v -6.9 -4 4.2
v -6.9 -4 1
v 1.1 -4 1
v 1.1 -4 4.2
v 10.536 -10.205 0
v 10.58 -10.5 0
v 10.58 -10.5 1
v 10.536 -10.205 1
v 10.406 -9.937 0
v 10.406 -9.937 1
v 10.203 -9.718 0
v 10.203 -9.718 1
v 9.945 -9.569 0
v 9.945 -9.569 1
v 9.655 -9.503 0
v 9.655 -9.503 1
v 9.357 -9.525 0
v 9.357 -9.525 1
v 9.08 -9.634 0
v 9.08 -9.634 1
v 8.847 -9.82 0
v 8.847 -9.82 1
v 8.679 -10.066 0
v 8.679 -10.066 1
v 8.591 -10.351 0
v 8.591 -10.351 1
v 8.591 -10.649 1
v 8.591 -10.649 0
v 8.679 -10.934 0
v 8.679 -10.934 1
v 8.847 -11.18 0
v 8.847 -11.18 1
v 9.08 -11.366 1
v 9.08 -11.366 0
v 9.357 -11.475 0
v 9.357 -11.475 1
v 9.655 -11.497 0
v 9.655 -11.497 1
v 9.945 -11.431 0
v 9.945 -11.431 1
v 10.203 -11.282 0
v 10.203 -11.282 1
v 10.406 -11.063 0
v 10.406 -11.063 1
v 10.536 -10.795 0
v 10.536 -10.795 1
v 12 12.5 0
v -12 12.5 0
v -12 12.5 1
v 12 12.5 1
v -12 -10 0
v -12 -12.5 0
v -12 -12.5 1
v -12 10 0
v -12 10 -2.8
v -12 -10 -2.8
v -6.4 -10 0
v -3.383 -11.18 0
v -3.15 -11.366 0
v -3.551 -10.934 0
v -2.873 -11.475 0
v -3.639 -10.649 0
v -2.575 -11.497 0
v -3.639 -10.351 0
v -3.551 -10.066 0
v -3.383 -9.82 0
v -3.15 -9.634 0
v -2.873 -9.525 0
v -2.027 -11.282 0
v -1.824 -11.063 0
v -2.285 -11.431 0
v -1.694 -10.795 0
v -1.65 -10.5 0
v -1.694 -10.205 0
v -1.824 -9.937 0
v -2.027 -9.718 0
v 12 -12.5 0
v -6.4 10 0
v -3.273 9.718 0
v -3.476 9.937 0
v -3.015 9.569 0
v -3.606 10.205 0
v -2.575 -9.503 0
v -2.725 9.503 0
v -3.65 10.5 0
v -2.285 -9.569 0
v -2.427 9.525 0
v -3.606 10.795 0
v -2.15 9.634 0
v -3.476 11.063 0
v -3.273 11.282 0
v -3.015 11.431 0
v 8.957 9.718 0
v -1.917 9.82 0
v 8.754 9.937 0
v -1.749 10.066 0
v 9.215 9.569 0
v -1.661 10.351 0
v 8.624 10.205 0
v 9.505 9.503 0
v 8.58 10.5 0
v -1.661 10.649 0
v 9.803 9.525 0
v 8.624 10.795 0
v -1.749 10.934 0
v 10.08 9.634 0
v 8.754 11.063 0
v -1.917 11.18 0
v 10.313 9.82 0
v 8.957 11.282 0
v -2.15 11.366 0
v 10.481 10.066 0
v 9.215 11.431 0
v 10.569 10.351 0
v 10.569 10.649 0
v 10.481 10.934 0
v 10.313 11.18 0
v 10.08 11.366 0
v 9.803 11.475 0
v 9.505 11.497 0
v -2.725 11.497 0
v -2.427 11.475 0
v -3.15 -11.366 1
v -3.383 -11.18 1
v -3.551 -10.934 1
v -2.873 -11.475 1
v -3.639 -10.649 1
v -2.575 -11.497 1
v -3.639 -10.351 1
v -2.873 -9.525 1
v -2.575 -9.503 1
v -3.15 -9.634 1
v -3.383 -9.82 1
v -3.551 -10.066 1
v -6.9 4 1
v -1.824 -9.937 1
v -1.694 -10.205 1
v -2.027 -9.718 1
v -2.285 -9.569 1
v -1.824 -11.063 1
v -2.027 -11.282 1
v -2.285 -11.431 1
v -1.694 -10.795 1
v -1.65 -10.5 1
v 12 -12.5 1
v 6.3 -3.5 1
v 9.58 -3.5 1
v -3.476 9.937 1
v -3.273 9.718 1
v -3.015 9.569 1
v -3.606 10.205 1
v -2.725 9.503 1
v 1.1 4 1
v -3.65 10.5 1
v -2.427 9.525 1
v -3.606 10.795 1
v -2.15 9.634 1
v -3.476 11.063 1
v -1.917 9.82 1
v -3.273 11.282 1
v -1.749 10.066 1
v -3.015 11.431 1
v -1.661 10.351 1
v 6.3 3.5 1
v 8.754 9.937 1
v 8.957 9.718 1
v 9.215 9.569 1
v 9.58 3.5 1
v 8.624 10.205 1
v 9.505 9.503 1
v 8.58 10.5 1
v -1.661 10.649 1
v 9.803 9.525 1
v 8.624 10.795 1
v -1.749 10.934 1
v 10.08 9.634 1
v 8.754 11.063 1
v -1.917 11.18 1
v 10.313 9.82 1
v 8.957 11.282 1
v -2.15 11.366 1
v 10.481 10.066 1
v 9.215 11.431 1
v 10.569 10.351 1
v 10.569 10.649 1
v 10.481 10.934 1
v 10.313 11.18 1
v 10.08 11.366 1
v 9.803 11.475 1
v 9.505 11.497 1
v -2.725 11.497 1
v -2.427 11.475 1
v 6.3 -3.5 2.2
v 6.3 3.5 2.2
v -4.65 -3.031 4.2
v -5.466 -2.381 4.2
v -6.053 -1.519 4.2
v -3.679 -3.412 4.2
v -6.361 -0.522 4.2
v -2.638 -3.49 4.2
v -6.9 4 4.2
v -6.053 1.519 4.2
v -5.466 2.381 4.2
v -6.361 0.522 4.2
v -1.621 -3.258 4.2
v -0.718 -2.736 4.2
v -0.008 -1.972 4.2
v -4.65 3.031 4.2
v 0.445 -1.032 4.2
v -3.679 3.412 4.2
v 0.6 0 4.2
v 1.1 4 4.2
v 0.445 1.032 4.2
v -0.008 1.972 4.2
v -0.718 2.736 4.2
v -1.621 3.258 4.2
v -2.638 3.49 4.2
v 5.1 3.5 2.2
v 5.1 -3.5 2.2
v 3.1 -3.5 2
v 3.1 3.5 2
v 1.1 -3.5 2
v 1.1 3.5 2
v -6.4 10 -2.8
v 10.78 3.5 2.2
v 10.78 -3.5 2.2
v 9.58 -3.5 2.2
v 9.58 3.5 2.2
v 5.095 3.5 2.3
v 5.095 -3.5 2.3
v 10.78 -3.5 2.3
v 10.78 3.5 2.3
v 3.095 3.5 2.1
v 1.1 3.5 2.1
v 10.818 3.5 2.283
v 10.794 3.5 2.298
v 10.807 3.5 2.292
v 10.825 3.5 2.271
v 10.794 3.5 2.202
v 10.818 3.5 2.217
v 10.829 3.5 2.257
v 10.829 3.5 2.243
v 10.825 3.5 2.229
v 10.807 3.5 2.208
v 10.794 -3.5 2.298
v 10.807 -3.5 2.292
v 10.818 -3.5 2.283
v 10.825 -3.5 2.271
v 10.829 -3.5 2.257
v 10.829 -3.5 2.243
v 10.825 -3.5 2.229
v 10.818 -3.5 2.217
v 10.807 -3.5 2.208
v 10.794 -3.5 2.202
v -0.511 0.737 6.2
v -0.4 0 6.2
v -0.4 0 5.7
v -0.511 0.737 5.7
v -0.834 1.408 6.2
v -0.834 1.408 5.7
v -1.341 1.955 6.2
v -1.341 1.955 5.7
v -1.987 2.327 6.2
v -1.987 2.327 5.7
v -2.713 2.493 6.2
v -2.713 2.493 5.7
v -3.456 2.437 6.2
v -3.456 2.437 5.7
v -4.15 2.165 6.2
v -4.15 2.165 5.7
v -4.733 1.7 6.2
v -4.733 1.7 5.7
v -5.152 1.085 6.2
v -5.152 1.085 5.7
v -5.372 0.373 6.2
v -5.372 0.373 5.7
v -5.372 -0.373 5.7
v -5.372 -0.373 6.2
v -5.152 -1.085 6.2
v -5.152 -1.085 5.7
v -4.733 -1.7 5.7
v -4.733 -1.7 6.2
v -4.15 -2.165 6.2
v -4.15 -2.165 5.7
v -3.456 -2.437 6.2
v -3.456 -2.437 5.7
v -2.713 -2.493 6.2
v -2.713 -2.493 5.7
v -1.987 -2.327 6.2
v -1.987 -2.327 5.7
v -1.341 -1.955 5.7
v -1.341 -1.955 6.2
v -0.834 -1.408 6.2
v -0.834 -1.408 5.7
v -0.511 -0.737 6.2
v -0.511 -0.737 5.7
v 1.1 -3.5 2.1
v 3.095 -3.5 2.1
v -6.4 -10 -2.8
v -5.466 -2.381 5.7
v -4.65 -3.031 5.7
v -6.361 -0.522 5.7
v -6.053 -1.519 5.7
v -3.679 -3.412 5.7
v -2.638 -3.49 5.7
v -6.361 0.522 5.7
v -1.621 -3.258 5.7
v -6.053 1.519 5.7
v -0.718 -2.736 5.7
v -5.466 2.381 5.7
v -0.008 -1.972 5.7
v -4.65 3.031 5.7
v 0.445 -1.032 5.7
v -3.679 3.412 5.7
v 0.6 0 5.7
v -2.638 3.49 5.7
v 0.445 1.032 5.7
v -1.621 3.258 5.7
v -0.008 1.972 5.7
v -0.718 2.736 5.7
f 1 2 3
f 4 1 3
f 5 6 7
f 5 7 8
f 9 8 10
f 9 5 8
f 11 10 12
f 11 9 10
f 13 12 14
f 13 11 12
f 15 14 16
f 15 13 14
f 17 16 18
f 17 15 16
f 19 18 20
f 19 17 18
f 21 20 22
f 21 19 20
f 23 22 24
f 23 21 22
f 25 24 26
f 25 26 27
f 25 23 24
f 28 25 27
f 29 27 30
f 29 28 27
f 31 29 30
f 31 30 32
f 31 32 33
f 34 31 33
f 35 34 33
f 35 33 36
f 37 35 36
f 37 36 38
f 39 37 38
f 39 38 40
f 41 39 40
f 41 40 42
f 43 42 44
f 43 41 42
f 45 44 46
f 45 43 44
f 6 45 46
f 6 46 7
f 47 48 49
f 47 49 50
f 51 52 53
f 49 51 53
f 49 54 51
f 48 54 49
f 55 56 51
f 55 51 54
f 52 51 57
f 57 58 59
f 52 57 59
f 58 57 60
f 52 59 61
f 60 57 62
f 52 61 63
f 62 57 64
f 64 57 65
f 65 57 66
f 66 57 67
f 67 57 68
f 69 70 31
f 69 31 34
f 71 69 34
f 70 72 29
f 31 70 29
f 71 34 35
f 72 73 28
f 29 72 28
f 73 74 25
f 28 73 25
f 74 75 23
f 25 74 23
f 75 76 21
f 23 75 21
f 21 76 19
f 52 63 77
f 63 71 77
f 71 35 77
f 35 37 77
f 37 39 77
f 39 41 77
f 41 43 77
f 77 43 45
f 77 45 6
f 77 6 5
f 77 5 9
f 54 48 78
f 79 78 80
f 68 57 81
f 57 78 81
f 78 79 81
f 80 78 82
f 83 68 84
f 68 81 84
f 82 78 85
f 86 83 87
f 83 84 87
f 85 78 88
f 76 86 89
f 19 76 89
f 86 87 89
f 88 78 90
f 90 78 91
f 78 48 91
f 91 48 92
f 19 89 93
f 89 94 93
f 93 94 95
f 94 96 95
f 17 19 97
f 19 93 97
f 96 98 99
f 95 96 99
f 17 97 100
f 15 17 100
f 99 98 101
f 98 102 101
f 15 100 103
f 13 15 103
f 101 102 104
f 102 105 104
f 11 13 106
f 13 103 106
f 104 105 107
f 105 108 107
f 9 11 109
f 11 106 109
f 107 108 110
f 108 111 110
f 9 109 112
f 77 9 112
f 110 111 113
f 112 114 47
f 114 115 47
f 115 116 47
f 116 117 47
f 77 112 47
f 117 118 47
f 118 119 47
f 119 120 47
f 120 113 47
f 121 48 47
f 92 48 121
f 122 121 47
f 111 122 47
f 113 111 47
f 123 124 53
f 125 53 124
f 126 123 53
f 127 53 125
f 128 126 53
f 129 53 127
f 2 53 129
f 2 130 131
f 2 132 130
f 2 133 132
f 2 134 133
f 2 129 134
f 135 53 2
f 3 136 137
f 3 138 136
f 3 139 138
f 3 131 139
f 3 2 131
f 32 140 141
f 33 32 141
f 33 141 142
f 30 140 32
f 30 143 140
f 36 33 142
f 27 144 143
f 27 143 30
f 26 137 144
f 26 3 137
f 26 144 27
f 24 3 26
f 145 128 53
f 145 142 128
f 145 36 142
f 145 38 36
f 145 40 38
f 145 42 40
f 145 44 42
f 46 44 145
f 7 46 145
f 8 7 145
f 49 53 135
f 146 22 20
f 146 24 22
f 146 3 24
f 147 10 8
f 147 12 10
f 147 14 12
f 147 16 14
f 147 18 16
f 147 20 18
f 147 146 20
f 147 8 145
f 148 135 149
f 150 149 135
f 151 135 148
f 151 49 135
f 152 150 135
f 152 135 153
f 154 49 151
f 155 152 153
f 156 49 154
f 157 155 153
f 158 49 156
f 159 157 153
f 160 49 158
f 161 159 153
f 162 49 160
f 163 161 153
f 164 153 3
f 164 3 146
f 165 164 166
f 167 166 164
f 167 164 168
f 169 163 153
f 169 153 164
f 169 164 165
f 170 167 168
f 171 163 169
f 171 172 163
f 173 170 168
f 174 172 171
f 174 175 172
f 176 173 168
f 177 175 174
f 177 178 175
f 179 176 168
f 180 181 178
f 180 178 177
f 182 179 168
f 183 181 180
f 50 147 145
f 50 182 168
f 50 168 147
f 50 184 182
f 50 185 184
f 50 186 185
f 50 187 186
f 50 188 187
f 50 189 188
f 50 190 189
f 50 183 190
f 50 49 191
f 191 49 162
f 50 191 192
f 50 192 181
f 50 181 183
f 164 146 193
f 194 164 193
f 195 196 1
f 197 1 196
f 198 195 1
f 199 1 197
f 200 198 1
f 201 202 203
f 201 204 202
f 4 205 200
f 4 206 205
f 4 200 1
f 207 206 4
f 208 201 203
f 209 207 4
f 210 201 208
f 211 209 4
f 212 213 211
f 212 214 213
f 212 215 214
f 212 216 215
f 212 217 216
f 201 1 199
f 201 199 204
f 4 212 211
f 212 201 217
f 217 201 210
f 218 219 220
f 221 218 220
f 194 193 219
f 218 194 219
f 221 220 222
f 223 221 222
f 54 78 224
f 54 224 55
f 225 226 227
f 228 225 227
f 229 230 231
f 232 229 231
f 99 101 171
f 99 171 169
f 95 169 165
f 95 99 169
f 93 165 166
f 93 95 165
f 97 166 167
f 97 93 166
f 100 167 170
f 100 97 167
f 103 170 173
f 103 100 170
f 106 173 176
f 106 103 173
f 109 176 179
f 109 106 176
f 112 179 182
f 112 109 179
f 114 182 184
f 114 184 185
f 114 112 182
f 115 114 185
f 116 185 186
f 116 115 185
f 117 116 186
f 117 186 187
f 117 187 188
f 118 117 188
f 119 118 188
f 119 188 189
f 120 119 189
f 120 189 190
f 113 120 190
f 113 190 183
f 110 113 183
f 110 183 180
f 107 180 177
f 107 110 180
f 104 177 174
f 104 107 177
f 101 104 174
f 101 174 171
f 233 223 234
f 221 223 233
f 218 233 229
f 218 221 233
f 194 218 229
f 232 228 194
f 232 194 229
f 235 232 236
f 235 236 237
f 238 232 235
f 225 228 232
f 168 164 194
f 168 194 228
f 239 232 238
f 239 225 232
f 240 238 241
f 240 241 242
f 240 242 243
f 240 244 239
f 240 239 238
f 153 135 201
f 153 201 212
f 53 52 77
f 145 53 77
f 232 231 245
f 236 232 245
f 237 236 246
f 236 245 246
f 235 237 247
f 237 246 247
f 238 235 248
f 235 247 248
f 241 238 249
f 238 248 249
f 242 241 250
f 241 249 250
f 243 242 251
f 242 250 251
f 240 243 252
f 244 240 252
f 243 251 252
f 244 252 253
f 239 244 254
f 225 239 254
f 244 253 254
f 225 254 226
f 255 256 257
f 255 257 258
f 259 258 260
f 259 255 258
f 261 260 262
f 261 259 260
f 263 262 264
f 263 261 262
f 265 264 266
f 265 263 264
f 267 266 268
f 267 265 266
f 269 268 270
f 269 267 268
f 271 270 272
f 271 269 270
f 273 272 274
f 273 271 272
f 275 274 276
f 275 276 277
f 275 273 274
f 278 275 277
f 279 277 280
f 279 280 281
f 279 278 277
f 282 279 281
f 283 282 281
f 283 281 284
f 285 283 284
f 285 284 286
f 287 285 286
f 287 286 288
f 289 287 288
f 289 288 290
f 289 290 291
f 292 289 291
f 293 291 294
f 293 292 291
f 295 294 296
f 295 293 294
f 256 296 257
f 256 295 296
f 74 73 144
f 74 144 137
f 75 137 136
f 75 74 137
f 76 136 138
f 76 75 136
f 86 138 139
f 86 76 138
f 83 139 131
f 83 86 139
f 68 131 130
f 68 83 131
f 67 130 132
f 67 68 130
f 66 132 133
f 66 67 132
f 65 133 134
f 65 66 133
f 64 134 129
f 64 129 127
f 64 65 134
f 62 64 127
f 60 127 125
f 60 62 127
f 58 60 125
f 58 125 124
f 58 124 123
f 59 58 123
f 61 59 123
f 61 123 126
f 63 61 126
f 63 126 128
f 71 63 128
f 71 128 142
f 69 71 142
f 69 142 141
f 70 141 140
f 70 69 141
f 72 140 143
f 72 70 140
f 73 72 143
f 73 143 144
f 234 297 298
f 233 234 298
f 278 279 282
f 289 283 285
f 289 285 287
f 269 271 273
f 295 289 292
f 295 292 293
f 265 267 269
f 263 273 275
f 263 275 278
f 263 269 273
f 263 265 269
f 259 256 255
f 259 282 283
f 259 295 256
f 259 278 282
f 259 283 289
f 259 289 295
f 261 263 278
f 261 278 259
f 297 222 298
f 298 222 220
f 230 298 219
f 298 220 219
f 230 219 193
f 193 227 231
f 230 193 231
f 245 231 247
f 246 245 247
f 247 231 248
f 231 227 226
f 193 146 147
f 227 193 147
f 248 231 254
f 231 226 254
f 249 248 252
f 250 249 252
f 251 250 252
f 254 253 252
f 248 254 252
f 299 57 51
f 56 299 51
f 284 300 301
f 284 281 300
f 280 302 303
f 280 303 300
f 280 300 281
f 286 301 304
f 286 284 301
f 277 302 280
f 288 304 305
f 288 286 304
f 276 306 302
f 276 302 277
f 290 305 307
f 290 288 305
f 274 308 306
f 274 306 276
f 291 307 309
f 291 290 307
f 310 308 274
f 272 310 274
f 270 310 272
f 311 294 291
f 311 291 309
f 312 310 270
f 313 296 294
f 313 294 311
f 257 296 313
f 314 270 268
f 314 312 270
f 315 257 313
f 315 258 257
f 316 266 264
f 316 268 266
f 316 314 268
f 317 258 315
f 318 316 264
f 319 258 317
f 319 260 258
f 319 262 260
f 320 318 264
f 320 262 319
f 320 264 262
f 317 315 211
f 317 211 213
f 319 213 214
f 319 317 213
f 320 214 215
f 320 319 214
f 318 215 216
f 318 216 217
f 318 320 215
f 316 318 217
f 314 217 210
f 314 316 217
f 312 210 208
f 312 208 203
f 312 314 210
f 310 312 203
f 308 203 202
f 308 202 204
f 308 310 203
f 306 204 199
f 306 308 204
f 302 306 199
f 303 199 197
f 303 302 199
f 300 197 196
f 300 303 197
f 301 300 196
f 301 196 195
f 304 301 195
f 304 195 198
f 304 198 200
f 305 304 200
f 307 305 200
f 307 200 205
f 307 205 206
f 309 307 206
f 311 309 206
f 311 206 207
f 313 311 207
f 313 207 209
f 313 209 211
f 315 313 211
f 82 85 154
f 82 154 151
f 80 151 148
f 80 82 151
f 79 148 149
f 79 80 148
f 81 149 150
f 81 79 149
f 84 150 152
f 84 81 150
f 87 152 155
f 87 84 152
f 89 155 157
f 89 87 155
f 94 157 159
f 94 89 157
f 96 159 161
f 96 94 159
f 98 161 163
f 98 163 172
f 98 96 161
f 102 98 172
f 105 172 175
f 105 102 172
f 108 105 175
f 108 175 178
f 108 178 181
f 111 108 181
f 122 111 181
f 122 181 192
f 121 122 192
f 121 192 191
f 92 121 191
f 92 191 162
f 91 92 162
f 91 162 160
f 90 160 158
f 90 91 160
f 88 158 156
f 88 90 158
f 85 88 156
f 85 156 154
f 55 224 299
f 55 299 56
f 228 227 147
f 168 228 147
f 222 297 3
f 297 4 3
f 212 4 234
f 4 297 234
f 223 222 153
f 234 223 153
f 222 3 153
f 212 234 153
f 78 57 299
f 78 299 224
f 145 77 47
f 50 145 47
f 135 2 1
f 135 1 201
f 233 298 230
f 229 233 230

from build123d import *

# Parameters (mm, degrees)
CROQUIS1_W                   = 24
CROQUIS1_H                   = 25
CROQUIS1_R                   = 1
SALIENTE_EXTRUIR1_DEPTH      = 1
CROQUIS2_W                   = 8
CROQUIS2_H                   = 8
SALIENTE_EXTRUIR2_DEPTH      = 5.2
CROQUIS3_W                   = 8
CROQUIS3_H                   = 8
CROQUIS3_R                   = 3.5
CORTAR_EXTRUIR1_DEPTH        = 2
CROQUIS4_R                   = 3.5
CROQUIS4_R_2                 = 2.5
CORTAR_EXTRUIR2_DEPTH        = 0.5
SALIENTE_EXTRUIR3_DEPTH      = 3.5
SALIENTE_EXTRUIR3_DEPTH_BACK = 3.5
CROQUIS6_W                   = 5.6
CROQUIS6_H                   = 20
SALIENTE_EXTRUIR4_DEPTH      = 2.8


with BuildPart() as part:
    # Croquis1 → Saliente-Extruir1 (new body)
    with BuildSketch(Plane.XY):
        Rectangle(CROQUIS1_W, CROQUIS1_H)
        with Locations((9.58, -10.5)):
            Circle(CROQUIS1_R, mode=Mode.SUBTRACT)
        with Locations((-2.65, -10.5)):
            Circle(CROQUIS1_R, mode=Mode.SUBTRACT)
        with Locations(Location((9.58, 10.5, 0), (0, 0, 180))):
            Circle(CROQUIS1_R, mode=Mode.SUBTRACT)
        with Locations(Location((-2.65, 10.5, 0), (0, 0, 180))):
            Circle(CROQUIS1_R, mode=Mode.SUBTRACT)
    extrude(amount=SALIENTE_EXTRUIR1_DEPTH)

    # Croquis2 → Saliente-Extruir2 (add)
    with BuildSketch(Plane.XY.offset(1)):
        with Locations((-2.9, 0)):
            Rectangle(CROQUIS2_W, CROQUIS2_H)
    extrude(amount=SALIENTE_EXTRUIR2_DEPTH)

    # Croquis3 → Cortar-Extruir1 (cut)
    with BuildSketch(Plane.XY.offset(6.2)):
        with Locations((-2.9, 0)):
            Rectangle(CROQUIS3_W, CROQUIS3_H)
        with Locations((-2.9, 0)):
            Circle(CROQUIS3_R, mode=Mode.SUBTRACT)
    extrude(amount=-CORTAR_EXTRUIR1_DEPTH, mode=Mode.SUBTRACT)

    # Croquis4 → Cortar-Extruir2 (cut)
    with BuildSketch(Plane.XY.offset(6.2)):
        with Locations((-2.9, 0)):
            Circle(CROQUIS4_R)
        with Locations((-2.9, 0)):
            Circle(CROQUIS4_R_2, mode=Mode.SUBTRACT)
    extrude(amount=-CORTAR_EXTRUIR2_DEPTH, mode=Mode.SUBTRACT)

    # Croquis5 → Saliente-Extruir3 (add, two sides: drawn at the far end of the back side and taken through both)
    with BuildSketch(Plane(origin=(0, 0, 0), x_dir=(1, 0, 0), z_dir=(0, 1, 0)).offset(-SALIENTE_EXTRUIR3_DEPTH_BACK)):
        Polygon((8.58, -1), (6.3, -1), (6.3, -2.2), (9.58, -2.2), (9.58, -1), align=None)
        with BuildLine():
            Line((3.1, -2), (1.1, -2))
            Line((1.1, -2), (1.1, -2.1))
            Line((1.1, -2.1), (3.095012438, -2.1))
            Line((3.095012438, -2.1), (5.095012438, -2.3))
            Line((5.095012438, -2.3), (10.78, -2.3))
            ThreePointArc((10.78, -2.3), (10.83, -2.25), (10.78, -2.2))
            Line((10.78, -2.2), (9.58, -2.2))
            Line((9.58, -2.2), (6.3, -2.2))
            Line((6.3, -2.2), (5.1, -2.2))
            Line((5.1, -2.2), (3.1, -2))
        make_face()
    extrude(amount=SALIENTE_EXTRUIR3_DEPTH + SALIENTE_EXTRUIR3_DEPTH_BACK)

    # Croquis6 → Saliente-Extruir4 (add)
    with BuildSketch(Plane(origin=(0, 0, 0), x_dir=(-1, 0, 0), z_dir=(0, 0, -1))):
        with Locations((9.2, 0)):
            Rectangle(CROQUIS6_W, CROQUIS6_H)
    extrude(amount=SALIENTE_EXTRUIR4_DEPTH)


solid = part.part
